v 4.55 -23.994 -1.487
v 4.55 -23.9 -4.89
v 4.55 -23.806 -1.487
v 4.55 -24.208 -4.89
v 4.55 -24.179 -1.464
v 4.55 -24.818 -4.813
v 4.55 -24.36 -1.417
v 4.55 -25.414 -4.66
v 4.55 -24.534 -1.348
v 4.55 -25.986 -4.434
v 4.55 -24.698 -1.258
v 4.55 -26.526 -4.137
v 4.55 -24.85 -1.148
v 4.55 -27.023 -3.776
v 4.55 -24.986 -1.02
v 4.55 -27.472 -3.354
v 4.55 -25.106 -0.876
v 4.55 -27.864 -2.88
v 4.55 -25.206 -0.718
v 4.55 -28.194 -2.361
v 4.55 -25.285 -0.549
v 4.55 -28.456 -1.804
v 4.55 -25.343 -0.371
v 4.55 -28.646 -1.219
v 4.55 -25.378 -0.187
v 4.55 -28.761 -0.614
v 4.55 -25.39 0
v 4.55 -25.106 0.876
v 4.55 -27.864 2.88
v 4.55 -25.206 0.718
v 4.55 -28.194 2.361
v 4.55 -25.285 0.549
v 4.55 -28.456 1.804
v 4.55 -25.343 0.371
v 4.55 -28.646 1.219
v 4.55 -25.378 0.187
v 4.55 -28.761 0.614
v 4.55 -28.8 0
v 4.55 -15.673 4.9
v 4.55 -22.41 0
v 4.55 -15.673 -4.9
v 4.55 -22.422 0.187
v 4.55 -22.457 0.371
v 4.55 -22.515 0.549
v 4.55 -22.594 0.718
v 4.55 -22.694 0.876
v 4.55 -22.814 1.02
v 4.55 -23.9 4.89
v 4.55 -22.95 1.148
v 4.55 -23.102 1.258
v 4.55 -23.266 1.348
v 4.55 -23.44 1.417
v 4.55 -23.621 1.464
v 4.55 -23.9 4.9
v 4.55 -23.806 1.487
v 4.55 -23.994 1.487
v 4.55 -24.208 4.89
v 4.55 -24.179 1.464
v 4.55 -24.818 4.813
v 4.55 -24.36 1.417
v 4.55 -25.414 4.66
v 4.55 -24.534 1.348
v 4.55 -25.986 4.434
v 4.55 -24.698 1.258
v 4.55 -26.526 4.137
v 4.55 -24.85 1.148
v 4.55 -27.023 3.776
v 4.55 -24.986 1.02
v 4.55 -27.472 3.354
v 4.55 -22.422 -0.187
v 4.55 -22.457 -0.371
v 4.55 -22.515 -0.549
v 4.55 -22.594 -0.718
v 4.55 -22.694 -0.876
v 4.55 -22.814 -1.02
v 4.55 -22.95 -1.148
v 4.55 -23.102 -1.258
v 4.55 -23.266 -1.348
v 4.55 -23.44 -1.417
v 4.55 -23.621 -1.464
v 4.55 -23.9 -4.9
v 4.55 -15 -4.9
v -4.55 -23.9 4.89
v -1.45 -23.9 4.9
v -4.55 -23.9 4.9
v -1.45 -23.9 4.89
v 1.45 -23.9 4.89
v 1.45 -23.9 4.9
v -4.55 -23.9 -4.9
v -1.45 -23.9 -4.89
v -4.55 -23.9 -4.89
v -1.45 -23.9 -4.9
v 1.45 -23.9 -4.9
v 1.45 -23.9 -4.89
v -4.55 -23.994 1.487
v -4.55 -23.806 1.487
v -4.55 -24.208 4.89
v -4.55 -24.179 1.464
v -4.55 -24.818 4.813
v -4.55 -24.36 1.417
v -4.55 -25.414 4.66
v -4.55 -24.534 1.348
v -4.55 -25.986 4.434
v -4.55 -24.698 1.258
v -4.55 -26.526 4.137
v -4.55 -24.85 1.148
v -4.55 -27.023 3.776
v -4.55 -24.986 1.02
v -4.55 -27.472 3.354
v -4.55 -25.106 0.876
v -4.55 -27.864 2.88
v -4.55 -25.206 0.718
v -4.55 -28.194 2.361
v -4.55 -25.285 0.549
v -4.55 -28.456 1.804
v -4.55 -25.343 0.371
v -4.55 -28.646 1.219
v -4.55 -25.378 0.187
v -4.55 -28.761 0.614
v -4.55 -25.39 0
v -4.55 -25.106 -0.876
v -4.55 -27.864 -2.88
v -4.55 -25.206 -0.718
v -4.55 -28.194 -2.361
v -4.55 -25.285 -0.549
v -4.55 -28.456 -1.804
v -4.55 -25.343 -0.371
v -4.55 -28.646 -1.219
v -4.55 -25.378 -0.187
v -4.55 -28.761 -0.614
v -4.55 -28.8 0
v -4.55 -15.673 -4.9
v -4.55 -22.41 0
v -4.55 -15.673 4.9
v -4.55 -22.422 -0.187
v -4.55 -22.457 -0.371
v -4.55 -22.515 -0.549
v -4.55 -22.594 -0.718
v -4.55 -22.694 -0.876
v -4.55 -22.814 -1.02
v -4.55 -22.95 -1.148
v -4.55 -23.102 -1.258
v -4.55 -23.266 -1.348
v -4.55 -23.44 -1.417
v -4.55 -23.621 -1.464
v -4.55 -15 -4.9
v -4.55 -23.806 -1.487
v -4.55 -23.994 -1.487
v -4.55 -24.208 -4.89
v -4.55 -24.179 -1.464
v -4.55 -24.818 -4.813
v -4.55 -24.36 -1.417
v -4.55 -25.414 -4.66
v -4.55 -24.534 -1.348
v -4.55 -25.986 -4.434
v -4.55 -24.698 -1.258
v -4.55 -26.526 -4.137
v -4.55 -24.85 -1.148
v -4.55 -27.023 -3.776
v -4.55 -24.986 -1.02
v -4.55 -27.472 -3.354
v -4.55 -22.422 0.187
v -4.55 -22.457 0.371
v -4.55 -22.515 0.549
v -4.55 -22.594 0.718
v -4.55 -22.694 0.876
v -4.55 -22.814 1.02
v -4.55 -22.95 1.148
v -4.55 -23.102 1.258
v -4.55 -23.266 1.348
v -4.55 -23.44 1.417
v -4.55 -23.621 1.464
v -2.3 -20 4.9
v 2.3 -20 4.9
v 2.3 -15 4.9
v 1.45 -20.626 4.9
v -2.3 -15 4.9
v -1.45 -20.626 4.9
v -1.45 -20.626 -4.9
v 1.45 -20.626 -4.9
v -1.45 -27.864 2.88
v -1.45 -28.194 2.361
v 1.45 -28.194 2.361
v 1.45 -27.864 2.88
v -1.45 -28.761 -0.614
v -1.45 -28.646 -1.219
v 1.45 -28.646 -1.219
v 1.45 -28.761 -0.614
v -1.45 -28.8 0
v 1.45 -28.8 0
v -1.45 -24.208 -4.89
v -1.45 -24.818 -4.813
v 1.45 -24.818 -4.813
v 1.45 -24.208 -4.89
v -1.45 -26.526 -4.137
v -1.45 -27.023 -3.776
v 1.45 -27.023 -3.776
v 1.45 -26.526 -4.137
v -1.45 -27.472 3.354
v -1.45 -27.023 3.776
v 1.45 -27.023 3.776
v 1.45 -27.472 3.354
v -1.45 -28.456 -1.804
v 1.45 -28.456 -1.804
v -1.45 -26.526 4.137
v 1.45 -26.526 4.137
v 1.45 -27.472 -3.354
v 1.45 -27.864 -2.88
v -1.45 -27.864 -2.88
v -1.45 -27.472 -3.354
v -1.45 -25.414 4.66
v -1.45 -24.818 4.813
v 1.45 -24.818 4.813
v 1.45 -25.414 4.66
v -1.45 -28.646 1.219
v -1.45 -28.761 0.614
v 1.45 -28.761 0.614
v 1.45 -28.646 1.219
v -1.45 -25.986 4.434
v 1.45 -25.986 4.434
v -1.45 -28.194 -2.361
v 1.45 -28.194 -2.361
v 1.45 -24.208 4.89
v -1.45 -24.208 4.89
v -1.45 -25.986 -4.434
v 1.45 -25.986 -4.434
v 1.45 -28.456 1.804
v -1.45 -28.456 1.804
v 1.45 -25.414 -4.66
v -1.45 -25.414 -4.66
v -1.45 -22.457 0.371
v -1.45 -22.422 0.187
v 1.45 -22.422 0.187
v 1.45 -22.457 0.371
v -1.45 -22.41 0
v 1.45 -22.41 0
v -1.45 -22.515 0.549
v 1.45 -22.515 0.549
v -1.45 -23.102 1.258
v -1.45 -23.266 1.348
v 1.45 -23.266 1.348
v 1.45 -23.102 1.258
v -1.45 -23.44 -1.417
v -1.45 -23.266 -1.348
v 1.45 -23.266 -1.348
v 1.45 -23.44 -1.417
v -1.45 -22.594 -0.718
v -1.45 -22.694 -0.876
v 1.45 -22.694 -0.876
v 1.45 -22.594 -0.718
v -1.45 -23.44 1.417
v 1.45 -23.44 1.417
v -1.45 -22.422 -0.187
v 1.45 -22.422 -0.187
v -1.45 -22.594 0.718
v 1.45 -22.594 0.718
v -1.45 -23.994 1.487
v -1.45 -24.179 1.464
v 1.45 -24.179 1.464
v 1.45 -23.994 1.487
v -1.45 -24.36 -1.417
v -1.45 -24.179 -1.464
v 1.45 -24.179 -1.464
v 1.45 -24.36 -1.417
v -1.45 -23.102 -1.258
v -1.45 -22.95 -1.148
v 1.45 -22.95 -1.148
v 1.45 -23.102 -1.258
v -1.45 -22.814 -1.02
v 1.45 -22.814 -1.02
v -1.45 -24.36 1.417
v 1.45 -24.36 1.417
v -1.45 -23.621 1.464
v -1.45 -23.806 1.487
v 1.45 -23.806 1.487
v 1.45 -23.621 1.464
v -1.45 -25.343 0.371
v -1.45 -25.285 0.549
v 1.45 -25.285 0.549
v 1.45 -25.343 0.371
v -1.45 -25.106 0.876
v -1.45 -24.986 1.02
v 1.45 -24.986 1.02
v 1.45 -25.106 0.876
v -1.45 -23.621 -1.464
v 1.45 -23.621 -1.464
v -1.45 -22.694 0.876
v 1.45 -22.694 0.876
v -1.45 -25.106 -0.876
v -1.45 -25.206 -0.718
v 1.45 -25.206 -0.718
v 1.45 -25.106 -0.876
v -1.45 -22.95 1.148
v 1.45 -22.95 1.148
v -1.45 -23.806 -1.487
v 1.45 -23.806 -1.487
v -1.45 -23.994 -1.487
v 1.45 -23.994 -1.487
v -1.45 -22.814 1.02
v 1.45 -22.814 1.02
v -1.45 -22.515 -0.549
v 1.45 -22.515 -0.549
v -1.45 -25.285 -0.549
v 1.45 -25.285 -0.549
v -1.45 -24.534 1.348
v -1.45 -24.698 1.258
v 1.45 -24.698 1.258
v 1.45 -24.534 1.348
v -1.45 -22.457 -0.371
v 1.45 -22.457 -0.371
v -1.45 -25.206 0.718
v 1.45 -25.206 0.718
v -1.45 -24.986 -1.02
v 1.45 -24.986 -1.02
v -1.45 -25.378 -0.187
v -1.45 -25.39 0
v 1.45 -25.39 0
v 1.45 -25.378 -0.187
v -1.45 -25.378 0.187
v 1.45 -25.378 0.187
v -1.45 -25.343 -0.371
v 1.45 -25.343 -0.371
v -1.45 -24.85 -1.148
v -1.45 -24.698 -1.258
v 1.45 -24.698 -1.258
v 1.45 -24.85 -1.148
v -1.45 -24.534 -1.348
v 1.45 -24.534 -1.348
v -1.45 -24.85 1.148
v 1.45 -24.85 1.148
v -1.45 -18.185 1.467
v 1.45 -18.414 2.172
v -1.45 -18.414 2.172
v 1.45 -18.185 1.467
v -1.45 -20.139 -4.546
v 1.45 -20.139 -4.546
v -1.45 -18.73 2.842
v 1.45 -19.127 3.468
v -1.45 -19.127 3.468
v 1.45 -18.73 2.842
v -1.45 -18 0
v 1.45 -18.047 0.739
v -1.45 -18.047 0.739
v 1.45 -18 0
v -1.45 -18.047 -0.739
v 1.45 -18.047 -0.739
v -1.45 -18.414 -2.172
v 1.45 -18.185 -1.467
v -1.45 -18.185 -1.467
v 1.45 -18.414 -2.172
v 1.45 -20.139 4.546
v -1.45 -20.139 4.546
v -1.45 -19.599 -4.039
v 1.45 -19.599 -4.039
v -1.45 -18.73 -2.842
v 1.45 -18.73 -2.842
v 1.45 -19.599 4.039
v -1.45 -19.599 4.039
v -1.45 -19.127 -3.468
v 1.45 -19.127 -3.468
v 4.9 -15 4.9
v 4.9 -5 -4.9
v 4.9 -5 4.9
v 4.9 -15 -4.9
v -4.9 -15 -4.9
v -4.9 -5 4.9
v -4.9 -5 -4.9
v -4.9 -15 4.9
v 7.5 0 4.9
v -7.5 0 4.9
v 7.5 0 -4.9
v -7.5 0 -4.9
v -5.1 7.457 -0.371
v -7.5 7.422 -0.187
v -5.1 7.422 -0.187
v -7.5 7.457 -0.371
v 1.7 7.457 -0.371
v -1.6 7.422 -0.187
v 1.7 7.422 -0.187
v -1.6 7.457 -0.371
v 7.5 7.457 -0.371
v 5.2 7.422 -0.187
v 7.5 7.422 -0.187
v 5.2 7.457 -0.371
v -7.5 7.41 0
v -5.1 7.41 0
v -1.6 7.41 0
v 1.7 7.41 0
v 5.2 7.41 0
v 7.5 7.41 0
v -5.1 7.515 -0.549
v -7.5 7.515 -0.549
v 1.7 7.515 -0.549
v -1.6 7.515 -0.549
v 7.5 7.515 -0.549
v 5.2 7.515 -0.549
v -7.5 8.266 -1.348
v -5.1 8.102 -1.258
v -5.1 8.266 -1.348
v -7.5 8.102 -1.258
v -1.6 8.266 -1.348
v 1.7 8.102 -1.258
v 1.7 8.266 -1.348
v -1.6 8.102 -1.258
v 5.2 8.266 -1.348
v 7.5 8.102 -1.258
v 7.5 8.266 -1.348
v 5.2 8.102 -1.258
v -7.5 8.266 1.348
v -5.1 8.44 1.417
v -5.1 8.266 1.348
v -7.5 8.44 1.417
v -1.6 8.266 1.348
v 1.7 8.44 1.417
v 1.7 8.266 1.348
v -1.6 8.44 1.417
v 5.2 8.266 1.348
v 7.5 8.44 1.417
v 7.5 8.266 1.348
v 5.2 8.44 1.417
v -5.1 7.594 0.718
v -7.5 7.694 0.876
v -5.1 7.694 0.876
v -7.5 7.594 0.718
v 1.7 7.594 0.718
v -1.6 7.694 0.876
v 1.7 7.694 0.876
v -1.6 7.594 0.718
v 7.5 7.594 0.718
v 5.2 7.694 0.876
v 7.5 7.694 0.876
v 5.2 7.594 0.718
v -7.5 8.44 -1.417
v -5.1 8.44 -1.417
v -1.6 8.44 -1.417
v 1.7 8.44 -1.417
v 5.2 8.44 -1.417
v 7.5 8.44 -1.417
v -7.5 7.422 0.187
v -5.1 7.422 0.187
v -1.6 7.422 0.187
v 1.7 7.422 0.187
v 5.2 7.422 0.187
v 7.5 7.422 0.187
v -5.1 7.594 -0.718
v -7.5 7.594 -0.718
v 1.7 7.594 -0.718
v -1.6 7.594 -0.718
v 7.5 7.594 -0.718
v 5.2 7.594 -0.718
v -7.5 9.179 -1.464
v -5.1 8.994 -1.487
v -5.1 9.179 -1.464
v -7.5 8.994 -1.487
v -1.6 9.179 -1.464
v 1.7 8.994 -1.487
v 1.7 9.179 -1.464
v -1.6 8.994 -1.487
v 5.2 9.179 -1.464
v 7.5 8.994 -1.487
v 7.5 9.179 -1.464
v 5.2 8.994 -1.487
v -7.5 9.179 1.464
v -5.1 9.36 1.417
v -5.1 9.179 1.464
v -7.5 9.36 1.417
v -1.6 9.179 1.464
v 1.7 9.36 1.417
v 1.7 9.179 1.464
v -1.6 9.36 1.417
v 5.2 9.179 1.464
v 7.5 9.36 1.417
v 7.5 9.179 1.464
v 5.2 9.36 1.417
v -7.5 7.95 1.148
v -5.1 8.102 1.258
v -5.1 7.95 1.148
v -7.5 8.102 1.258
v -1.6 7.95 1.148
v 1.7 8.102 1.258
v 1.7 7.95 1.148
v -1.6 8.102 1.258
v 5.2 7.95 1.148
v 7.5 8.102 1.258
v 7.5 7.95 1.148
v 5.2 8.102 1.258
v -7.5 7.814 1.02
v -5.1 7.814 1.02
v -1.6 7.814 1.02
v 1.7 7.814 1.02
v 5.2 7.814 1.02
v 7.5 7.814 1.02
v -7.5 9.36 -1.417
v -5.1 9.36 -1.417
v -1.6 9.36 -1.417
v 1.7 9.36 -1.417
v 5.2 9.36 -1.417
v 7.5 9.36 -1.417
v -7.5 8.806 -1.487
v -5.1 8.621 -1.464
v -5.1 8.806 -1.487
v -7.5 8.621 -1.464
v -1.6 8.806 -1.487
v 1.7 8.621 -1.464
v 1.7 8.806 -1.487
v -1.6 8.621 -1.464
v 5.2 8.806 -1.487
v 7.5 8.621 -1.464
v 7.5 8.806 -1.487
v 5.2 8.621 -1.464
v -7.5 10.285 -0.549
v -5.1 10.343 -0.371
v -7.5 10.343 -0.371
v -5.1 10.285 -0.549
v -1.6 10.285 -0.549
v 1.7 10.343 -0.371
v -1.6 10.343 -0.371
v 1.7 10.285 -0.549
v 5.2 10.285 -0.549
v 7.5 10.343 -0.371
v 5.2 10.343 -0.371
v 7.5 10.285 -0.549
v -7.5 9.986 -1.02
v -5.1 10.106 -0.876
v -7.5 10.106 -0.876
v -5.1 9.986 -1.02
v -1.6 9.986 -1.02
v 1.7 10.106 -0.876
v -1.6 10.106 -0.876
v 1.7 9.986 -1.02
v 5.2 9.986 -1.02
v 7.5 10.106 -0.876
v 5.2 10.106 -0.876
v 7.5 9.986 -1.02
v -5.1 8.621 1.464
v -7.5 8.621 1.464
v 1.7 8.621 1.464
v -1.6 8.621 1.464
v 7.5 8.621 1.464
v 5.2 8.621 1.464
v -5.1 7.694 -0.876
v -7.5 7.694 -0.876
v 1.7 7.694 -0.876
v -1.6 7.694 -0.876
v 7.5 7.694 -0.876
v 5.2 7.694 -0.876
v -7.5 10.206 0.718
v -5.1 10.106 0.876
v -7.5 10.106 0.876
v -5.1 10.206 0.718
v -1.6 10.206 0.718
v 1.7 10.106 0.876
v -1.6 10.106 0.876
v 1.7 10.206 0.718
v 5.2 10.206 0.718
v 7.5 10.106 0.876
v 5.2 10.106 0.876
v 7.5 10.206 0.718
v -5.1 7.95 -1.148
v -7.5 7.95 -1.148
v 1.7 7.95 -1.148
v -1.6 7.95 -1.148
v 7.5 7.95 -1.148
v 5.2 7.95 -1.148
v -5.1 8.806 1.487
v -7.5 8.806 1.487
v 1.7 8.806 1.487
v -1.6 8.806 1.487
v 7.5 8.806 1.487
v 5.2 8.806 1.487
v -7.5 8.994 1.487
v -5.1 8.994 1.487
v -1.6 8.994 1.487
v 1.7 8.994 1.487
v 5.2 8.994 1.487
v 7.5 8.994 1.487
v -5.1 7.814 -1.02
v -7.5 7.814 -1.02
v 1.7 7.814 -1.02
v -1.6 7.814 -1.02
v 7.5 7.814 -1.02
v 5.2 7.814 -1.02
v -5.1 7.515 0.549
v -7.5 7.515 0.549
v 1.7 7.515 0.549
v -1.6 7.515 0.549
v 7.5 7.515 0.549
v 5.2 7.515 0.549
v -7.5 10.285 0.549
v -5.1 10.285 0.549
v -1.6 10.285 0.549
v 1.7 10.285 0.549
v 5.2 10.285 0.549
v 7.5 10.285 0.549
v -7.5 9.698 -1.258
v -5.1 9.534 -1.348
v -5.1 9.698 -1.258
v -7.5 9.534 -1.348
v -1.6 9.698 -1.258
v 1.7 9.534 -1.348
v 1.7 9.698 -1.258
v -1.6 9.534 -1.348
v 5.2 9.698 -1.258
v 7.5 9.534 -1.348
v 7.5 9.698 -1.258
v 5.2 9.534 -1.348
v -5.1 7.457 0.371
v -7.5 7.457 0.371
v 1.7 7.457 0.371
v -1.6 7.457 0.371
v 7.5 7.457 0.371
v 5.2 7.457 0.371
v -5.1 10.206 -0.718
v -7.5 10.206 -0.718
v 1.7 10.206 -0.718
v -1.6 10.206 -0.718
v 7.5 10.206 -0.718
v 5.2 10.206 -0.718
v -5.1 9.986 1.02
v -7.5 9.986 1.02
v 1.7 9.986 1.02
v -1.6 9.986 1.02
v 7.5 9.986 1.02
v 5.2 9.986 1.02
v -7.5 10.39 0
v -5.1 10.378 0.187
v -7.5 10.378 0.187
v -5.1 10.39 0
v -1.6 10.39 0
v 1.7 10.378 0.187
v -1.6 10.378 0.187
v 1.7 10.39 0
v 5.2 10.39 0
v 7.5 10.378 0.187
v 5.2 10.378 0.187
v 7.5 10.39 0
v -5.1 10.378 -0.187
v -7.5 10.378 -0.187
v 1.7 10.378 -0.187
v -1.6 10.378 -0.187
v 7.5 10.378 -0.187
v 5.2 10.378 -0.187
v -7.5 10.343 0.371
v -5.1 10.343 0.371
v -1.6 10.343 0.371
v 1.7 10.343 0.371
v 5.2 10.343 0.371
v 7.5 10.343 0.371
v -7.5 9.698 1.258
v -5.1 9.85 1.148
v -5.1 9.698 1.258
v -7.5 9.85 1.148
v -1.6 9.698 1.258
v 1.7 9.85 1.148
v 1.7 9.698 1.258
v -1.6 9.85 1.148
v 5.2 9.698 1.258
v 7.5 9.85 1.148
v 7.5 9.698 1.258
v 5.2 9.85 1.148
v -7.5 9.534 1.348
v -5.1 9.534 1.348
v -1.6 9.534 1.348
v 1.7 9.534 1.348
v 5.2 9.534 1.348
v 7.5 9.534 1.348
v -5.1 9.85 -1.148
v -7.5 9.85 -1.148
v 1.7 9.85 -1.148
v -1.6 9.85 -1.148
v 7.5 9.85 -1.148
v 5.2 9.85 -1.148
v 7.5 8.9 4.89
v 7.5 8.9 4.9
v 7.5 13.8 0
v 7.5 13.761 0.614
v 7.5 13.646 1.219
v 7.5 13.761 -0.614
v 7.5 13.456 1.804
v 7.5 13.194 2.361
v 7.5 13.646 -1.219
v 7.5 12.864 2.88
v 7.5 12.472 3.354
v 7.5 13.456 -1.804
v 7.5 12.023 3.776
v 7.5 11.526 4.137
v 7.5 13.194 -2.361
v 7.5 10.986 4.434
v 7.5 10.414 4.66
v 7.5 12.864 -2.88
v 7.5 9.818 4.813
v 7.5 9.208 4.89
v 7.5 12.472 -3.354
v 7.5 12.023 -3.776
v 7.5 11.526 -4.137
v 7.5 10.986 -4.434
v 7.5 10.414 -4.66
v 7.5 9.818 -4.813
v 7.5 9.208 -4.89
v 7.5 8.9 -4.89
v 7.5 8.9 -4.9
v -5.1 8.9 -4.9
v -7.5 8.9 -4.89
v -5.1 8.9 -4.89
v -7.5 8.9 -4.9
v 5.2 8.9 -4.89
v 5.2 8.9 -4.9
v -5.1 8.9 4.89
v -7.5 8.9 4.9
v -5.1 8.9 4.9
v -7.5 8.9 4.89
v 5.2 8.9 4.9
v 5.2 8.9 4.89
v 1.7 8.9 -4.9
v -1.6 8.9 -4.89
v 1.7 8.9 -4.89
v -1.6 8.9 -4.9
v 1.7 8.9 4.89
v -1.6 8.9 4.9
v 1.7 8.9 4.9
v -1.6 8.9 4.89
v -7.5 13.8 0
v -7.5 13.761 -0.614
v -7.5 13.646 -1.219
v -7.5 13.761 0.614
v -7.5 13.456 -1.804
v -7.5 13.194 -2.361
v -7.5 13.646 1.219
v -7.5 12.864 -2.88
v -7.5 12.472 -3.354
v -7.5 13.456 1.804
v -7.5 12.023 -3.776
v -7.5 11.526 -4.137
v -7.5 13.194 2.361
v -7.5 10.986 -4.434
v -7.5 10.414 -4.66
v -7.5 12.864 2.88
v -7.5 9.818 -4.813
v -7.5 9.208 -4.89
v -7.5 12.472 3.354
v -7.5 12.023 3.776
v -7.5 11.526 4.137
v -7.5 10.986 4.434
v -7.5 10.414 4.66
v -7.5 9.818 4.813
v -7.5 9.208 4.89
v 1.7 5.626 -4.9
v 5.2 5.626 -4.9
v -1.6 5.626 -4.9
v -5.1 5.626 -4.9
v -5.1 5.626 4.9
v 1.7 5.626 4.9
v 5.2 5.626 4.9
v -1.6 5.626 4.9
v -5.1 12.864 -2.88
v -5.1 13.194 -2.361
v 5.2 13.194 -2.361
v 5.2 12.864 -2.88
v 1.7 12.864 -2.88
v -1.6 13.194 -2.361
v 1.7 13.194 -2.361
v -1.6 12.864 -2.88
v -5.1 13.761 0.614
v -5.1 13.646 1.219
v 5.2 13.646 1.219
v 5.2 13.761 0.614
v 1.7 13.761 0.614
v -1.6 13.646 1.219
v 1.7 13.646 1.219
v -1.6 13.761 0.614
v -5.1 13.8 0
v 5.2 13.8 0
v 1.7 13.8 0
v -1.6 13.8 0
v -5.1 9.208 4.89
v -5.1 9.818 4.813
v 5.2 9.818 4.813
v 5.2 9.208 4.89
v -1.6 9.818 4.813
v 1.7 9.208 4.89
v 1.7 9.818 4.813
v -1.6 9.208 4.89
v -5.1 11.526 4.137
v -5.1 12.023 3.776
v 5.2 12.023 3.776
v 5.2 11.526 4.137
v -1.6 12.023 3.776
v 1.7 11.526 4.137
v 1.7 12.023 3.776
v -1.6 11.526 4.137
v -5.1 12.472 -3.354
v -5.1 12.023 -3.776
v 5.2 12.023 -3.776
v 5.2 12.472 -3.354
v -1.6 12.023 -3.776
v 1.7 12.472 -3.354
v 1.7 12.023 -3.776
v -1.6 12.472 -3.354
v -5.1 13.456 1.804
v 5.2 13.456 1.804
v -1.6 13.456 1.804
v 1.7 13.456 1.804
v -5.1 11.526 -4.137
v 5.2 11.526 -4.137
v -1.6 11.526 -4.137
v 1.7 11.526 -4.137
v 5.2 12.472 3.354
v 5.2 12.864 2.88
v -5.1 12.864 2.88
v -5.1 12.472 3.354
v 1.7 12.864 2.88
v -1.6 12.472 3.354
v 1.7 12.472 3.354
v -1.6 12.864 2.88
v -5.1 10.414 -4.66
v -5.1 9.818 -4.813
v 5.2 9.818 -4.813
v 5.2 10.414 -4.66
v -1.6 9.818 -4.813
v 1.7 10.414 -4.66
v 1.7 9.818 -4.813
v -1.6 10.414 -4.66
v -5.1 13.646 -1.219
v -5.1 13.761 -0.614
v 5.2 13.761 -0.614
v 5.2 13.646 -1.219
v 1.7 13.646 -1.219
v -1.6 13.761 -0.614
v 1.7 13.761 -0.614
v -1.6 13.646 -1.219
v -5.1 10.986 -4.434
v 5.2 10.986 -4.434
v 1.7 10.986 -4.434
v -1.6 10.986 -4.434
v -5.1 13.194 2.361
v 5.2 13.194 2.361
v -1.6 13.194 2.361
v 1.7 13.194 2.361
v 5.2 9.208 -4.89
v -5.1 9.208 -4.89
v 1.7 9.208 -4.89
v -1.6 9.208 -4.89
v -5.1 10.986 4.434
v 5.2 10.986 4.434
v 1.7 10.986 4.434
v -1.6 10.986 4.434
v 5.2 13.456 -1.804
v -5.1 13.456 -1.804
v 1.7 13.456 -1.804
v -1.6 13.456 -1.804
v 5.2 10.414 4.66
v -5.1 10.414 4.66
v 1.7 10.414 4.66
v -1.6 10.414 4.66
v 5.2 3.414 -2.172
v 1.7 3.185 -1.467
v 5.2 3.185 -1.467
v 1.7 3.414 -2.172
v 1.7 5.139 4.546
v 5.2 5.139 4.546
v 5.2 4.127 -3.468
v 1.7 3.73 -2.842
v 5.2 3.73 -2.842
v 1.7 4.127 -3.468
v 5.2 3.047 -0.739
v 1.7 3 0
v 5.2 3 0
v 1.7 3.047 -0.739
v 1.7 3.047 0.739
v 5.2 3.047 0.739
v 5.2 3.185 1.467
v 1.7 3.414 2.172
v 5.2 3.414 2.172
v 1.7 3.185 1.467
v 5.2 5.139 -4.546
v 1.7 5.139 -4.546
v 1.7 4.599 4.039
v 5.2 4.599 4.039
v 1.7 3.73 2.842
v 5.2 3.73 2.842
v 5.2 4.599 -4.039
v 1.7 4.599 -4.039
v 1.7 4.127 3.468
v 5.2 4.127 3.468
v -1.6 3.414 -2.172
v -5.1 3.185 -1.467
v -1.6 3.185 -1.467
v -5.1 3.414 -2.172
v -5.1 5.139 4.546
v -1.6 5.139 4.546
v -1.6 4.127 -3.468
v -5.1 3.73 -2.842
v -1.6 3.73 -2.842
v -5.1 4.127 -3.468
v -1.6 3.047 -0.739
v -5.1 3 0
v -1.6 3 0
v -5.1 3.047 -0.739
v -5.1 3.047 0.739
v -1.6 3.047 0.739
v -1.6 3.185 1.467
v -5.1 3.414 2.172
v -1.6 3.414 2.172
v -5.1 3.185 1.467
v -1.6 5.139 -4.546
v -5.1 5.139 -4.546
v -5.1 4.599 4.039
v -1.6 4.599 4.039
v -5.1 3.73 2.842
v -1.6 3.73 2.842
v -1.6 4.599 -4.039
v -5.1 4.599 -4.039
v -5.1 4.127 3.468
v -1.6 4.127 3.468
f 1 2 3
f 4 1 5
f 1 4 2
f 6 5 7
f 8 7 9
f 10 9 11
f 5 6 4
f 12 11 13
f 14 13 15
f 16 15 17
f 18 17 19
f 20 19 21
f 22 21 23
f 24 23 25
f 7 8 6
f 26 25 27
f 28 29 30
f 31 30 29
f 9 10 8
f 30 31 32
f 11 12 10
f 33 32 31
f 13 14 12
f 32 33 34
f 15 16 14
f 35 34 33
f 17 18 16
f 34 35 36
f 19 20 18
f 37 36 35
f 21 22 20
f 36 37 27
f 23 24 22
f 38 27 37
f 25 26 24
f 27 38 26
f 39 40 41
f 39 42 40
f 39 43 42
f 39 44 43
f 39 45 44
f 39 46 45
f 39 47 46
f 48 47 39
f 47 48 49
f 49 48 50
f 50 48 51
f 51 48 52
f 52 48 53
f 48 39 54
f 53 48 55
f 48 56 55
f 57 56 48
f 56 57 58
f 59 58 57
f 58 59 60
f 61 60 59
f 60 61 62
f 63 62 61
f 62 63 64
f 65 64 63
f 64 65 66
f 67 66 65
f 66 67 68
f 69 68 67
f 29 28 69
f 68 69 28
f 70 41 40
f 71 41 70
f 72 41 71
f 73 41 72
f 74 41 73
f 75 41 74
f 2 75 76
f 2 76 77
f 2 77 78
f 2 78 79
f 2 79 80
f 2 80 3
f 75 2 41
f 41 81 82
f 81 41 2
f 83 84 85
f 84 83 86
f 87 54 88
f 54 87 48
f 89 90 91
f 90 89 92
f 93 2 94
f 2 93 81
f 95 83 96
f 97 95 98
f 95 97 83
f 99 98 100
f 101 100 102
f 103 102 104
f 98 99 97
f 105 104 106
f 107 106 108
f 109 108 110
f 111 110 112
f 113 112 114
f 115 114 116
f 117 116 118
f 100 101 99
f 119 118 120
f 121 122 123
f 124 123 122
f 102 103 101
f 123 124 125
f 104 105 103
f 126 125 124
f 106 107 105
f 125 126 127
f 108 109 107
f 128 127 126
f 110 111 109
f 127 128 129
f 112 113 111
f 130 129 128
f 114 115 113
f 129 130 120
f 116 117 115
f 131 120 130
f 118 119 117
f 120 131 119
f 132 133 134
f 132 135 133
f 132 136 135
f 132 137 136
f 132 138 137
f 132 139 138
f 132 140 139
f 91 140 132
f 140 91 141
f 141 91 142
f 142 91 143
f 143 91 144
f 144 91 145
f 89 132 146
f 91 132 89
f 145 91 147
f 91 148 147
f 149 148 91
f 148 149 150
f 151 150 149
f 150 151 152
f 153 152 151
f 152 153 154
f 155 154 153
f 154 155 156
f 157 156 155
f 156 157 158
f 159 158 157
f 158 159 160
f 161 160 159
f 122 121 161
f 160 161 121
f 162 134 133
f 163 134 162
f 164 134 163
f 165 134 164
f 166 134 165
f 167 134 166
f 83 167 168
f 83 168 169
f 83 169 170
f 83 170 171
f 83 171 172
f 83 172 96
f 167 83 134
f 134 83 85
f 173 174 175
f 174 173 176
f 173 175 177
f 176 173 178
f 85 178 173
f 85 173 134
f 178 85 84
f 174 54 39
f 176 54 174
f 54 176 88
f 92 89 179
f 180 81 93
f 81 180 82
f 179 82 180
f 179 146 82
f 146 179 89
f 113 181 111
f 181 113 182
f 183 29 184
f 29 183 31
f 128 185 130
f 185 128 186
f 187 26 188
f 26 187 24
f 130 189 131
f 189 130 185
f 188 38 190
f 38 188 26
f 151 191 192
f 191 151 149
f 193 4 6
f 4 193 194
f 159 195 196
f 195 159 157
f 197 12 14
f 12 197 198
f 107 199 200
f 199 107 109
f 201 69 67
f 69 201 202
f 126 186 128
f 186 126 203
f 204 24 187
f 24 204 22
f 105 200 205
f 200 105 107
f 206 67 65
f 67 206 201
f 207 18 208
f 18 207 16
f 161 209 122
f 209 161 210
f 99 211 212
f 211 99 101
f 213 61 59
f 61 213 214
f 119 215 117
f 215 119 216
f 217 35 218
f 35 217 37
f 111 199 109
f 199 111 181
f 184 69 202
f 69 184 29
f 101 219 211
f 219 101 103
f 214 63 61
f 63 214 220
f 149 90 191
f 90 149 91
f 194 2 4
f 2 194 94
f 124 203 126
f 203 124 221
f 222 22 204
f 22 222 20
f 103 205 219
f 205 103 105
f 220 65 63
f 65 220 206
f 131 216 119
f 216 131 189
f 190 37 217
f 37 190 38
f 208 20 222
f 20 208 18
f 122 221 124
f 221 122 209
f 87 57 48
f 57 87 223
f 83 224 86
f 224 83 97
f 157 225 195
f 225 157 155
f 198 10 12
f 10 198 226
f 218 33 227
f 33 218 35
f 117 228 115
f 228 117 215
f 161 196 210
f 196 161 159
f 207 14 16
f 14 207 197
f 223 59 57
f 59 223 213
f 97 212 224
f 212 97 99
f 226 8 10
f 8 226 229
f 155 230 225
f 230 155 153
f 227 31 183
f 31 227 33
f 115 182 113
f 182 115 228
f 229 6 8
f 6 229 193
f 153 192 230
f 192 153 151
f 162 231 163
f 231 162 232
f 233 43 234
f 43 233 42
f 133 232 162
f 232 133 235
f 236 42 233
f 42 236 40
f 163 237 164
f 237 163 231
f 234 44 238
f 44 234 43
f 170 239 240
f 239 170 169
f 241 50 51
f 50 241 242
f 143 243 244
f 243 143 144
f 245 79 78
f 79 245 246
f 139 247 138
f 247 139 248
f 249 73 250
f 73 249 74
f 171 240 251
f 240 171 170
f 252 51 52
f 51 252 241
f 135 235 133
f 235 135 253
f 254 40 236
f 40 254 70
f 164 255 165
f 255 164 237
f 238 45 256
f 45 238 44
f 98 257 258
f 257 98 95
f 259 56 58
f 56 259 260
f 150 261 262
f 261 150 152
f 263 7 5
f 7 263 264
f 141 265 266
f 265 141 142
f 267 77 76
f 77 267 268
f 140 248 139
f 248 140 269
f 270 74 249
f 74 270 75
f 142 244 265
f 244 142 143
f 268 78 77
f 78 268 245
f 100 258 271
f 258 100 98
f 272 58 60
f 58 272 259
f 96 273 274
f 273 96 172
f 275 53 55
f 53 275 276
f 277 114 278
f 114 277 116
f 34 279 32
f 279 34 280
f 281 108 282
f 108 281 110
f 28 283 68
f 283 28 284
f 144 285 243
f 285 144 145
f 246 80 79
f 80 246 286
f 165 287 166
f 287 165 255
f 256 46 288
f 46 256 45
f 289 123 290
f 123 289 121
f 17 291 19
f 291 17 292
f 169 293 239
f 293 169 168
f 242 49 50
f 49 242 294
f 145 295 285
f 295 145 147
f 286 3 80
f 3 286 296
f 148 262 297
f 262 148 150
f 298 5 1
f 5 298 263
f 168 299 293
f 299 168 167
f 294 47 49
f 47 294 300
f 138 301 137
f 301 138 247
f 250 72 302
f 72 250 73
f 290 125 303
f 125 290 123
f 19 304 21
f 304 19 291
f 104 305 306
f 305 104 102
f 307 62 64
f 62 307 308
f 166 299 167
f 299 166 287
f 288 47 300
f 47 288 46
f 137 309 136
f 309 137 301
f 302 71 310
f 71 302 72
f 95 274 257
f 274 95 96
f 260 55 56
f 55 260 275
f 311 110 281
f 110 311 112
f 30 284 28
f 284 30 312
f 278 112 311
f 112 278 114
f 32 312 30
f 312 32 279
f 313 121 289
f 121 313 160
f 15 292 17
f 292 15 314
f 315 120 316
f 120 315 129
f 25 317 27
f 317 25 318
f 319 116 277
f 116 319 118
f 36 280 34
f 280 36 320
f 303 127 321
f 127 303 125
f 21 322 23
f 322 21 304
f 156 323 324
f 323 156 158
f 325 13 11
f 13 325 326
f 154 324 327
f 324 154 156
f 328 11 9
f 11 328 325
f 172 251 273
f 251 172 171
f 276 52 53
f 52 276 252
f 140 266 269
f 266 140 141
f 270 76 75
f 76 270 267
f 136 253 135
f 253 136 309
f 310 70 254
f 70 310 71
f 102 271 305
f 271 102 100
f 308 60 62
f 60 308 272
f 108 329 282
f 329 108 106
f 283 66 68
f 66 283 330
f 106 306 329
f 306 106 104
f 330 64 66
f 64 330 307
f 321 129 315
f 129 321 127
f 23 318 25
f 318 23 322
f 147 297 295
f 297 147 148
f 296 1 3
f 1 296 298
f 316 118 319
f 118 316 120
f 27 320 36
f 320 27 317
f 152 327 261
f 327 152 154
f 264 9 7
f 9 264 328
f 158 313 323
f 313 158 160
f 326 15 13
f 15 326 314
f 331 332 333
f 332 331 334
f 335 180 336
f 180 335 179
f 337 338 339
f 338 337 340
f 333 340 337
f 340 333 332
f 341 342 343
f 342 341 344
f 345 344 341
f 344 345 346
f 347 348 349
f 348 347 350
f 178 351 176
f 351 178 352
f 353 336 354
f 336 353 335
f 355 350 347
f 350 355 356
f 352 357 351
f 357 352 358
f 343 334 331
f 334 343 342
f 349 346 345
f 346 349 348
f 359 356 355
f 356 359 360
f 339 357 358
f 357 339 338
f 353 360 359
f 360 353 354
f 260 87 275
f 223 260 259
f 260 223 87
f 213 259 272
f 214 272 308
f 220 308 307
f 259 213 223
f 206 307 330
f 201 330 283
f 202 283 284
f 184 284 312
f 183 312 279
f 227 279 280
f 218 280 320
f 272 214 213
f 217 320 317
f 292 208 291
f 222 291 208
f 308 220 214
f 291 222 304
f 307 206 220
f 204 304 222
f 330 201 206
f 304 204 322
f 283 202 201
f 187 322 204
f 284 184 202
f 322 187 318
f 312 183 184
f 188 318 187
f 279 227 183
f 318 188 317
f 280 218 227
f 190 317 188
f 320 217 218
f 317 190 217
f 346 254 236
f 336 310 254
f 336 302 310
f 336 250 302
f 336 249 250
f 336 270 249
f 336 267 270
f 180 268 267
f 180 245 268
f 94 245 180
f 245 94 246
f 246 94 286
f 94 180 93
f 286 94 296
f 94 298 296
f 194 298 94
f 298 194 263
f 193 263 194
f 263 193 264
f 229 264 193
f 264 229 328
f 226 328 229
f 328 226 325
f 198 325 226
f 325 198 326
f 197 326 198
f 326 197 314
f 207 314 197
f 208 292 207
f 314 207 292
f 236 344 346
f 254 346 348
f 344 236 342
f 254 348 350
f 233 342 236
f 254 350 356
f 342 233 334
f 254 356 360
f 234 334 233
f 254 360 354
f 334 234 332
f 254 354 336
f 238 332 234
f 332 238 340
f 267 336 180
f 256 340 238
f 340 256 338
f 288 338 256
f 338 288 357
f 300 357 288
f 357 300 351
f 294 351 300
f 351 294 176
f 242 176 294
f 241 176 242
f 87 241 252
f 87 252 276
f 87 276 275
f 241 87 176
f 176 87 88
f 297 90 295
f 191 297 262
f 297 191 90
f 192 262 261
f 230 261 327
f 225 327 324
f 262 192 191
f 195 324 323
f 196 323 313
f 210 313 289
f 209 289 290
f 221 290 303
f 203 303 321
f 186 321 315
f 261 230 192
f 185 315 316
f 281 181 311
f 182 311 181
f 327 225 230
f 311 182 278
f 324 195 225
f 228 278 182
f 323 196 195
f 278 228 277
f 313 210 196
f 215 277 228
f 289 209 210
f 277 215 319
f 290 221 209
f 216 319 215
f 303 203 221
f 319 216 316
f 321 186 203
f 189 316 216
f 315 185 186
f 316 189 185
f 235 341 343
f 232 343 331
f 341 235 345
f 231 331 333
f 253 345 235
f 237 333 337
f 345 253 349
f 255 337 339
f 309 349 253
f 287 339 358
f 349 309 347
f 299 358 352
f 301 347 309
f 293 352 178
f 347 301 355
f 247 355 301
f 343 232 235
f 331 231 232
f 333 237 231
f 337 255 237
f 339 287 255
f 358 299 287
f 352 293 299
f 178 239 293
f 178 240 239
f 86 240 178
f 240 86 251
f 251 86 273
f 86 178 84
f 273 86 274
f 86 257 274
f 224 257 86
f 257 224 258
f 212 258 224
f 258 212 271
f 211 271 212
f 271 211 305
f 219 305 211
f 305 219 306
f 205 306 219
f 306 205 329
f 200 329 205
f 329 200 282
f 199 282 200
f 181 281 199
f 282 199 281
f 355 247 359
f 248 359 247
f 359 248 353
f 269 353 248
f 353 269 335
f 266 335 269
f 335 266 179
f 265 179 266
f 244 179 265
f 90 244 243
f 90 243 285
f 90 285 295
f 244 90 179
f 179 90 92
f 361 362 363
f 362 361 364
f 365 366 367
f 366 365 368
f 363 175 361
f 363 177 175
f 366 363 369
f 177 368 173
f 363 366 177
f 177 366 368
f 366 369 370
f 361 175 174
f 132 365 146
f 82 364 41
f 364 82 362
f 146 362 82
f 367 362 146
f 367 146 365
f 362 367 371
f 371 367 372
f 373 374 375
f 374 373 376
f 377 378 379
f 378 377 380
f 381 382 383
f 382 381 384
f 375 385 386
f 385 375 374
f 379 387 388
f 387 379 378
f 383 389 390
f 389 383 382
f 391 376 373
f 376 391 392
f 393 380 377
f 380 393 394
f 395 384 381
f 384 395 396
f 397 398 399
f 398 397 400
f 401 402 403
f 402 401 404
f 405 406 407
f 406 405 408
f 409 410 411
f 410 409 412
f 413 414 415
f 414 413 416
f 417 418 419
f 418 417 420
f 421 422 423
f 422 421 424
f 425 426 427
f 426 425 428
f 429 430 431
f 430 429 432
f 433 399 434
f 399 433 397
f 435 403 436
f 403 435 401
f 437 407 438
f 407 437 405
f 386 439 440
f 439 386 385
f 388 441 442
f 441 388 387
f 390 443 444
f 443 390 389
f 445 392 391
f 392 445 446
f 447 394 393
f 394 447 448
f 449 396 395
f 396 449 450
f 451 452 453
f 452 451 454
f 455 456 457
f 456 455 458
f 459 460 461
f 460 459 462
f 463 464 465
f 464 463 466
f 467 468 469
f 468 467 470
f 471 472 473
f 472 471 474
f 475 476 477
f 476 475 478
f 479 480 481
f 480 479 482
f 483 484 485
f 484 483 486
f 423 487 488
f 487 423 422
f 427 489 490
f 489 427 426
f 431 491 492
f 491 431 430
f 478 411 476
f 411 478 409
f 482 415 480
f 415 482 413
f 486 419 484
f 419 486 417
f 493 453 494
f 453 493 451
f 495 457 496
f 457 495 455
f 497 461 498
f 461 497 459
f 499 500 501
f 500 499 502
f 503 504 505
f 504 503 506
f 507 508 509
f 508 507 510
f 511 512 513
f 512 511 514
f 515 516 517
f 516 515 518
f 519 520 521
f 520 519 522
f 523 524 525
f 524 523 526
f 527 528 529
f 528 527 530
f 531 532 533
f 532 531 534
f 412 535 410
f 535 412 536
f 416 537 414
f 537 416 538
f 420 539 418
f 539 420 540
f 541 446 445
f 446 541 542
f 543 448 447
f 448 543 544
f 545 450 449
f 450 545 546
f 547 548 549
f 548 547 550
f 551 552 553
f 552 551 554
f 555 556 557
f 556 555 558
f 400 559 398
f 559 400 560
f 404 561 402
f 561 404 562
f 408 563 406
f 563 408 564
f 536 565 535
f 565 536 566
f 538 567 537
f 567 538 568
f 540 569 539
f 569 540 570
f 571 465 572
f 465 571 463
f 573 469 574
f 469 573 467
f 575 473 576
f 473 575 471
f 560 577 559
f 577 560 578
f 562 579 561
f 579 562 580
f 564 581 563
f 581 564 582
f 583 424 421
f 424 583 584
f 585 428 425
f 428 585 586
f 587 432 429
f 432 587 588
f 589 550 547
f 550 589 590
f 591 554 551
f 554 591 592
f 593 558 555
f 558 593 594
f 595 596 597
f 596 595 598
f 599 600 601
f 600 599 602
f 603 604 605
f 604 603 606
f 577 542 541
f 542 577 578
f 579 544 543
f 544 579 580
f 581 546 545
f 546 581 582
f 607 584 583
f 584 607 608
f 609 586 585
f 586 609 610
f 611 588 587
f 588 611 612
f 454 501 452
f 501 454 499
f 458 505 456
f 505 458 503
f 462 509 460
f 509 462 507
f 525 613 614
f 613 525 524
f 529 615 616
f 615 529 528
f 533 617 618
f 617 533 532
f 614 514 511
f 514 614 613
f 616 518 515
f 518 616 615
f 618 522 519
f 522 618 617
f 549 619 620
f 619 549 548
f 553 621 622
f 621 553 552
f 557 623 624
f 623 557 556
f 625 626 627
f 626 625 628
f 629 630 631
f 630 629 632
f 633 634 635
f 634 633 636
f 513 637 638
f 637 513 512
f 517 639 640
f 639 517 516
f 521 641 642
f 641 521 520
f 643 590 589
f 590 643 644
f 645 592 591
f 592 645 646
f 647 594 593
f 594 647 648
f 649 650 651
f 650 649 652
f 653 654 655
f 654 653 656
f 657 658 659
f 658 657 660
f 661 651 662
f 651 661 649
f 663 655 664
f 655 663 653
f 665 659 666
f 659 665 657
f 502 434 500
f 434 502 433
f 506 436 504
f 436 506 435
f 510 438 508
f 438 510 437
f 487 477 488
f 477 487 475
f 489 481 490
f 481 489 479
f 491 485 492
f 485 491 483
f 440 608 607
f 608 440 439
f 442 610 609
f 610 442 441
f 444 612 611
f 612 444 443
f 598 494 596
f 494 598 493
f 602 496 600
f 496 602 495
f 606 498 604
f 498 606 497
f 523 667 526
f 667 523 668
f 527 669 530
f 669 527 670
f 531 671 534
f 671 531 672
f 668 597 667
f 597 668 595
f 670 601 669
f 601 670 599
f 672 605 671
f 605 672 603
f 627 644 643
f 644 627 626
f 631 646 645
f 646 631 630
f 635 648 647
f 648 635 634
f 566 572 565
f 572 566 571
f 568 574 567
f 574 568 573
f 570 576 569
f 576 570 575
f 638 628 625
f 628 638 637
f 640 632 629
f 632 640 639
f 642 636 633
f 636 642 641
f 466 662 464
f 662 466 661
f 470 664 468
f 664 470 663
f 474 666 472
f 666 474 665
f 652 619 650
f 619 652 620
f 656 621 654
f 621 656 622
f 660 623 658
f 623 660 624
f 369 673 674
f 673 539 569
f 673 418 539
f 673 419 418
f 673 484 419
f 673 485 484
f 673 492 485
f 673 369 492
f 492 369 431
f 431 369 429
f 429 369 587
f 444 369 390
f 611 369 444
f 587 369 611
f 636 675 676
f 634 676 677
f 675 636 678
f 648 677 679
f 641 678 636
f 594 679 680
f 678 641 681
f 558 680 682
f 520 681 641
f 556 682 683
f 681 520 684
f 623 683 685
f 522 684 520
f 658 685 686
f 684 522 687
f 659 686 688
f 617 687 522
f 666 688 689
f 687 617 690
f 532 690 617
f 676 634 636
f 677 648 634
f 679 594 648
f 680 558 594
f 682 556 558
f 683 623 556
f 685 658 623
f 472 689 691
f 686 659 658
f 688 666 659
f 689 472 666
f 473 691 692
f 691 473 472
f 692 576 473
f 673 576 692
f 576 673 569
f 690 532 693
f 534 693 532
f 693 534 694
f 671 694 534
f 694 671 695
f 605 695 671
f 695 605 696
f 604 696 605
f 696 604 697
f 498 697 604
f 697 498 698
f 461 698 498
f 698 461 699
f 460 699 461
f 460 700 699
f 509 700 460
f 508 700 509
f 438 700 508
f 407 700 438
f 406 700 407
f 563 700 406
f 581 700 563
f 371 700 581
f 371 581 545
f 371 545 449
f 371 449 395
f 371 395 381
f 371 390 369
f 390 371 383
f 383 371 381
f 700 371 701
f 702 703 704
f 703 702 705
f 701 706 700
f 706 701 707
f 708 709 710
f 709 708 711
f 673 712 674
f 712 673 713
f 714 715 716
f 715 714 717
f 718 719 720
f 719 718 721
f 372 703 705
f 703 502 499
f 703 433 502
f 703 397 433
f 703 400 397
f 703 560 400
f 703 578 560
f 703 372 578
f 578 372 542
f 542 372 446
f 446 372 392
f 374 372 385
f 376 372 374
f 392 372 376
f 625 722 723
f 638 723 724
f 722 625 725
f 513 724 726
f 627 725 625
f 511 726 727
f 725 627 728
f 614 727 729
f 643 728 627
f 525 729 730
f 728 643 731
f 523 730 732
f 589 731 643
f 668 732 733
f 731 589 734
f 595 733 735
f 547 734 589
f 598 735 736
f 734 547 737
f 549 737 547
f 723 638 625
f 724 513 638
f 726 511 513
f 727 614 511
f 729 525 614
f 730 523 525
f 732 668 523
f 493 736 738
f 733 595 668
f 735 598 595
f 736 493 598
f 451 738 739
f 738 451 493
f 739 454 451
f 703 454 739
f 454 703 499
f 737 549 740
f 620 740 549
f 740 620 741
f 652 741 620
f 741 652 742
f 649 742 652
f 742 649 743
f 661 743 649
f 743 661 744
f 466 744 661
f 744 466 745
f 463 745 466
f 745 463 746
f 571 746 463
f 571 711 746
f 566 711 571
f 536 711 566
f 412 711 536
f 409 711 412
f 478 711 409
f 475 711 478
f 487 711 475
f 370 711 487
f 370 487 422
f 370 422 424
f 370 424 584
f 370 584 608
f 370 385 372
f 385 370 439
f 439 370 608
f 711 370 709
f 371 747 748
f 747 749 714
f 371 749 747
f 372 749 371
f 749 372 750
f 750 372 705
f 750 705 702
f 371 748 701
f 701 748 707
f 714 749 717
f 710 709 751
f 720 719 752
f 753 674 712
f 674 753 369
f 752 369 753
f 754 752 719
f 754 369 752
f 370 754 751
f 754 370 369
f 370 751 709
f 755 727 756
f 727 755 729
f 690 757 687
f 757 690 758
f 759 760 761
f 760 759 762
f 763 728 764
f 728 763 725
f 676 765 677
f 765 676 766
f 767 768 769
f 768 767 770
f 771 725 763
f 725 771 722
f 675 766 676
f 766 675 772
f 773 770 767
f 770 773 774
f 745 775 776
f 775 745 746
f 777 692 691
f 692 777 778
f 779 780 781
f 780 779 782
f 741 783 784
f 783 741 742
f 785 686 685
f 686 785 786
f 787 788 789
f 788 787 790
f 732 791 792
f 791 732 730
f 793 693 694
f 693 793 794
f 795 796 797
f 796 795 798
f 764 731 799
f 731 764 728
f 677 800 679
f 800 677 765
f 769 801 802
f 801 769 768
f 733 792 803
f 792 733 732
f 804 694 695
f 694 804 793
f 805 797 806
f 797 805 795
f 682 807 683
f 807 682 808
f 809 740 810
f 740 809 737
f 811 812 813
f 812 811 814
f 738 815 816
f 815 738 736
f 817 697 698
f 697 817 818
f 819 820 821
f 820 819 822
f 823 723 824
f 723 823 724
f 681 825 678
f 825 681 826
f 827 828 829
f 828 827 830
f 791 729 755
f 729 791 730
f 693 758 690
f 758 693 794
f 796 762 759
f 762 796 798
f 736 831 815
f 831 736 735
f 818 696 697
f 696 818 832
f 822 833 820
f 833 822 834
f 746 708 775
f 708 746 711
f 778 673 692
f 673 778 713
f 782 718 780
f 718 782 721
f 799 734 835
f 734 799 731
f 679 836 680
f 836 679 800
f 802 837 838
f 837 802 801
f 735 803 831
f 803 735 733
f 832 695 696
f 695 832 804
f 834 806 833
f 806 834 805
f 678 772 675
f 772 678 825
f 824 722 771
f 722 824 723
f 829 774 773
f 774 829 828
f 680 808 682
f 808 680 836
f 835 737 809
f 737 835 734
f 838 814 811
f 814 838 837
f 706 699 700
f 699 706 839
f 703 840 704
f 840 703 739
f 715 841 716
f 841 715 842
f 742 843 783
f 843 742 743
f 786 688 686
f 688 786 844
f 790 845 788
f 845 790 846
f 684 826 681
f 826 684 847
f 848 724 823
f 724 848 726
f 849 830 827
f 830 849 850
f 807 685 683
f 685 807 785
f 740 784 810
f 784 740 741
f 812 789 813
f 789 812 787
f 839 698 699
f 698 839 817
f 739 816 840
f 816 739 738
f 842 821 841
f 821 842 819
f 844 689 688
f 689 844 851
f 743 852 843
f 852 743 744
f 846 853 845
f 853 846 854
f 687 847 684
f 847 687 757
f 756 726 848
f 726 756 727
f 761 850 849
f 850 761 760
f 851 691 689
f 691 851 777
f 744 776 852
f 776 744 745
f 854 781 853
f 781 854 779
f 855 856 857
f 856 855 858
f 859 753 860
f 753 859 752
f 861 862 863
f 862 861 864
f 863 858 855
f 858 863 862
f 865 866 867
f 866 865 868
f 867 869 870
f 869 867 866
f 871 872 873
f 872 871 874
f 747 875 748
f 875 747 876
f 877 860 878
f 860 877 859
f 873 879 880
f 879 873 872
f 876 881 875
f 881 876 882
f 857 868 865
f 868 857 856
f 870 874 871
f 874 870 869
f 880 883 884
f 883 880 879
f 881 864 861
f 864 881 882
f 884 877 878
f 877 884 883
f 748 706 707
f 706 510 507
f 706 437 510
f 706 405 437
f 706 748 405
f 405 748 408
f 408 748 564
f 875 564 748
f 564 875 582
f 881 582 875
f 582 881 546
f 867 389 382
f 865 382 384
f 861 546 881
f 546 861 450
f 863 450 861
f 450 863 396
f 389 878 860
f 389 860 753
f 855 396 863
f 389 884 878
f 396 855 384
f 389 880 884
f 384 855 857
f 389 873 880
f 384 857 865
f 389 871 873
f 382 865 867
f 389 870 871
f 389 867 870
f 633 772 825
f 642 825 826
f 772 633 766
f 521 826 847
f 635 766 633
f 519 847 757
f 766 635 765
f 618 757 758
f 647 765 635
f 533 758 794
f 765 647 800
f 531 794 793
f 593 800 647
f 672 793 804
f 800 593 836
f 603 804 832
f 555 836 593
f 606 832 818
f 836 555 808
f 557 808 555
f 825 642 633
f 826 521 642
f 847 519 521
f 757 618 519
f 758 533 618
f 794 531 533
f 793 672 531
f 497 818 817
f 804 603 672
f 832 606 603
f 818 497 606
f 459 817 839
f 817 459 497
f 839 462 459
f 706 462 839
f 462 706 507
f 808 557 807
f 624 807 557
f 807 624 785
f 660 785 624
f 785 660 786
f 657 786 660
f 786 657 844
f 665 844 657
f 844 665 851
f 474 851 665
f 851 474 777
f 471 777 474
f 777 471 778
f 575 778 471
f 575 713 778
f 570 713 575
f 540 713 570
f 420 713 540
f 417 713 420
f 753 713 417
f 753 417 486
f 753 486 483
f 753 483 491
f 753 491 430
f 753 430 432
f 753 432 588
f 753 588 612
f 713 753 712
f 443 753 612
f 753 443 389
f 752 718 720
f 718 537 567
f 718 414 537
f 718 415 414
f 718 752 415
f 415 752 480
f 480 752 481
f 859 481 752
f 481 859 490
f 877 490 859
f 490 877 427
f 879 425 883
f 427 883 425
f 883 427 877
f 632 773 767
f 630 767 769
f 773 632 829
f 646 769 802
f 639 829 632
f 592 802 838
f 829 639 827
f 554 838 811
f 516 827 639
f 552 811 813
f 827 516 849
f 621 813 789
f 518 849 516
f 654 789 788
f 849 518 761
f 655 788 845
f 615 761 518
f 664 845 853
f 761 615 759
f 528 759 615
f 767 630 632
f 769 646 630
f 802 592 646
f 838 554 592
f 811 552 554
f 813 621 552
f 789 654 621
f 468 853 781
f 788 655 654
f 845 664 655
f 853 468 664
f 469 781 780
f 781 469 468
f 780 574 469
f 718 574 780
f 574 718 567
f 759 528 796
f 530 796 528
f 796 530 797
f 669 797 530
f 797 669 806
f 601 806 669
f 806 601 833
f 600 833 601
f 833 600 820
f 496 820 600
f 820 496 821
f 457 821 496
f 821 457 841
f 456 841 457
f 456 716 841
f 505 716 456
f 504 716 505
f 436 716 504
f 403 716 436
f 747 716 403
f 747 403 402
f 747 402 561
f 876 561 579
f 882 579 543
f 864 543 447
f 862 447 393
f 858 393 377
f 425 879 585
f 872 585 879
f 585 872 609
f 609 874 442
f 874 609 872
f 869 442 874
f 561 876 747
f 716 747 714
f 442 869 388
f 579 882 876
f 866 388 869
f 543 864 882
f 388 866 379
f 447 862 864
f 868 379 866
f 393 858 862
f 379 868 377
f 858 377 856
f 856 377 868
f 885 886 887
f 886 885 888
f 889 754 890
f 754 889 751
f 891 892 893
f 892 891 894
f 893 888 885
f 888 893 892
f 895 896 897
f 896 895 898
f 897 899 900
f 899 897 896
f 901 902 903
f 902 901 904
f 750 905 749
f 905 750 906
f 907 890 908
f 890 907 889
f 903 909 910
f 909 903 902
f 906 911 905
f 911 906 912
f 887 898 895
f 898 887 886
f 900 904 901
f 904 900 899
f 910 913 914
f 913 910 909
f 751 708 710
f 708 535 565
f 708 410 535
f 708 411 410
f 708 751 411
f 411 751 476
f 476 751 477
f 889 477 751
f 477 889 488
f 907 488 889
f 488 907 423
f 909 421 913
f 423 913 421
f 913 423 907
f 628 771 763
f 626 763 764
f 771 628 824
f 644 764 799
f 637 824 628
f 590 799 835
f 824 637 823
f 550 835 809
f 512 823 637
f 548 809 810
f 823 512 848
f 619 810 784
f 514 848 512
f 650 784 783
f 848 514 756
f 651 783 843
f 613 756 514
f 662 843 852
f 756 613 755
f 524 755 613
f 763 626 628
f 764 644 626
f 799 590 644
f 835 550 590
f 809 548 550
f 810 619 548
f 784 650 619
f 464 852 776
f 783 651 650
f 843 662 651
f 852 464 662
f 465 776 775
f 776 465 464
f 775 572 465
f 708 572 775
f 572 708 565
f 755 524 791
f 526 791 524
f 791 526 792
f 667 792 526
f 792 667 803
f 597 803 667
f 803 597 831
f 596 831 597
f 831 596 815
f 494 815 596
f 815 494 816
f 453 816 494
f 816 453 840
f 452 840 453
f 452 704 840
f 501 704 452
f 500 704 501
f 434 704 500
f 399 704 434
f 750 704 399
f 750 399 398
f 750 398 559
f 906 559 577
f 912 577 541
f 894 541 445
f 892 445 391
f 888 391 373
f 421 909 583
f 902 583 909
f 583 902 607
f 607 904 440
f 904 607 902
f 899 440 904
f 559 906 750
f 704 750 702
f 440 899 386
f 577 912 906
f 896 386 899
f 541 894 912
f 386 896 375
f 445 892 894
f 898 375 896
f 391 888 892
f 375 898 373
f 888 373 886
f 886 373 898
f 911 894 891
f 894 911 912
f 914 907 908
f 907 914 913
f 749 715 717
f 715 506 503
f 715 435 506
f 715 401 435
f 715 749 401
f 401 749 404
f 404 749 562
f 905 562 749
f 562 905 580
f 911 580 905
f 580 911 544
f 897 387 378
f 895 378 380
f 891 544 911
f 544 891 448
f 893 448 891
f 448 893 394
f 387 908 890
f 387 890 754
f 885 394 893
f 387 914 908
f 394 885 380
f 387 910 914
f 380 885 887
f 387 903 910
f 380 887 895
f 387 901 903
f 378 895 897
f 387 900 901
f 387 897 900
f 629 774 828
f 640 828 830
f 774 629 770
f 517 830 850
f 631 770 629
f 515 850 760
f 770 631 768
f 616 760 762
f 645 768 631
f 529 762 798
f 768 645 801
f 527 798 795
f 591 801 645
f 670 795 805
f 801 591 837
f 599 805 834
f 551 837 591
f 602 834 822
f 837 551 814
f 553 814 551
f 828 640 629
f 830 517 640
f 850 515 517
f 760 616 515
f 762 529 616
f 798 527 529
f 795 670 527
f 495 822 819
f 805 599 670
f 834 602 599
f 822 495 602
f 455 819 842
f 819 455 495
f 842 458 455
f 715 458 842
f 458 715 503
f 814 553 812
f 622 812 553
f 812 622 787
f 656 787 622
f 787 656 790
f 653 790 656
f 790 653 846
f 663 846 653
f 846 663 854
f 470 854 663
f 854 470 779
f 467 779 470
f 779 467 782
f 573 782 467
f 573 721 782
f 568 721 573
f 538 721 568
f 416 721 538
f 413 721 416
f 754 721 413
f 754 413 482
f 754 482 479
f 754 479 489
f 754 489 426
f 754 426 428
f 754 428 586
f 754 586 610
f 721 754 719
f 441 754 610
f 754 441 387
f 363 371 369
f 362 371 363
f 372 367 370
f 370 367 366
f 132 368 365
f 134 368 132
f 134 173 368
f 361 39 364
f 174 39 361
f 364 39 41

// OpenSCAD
// file: go_pro_style_mount.scad
// Go pro style mount
include <MCAD/nuts_and_bolts.scad>;
gp_mount_fin_width=3;
gp_mount_fin_margin=0.1;
gp_mount_fin_clearance=2;
gp_mount_width=17;
gp_mount_radius=9.8;
gp_mount_spacer_height=4;
module go_pro_base(){
    $fn=50;
    translate([-gp_mount_width/2,-gp_mount_radius/2,0]){
        difference(){
            group(){
            //base
            cube([gp_mount_width,
                    gp_mount_radius,
                    gp_mount_radius/2+gp_mount_spacer_height]);
            //rouded part
            translate([0,
                        gp_mount_radius/2,
                        gp_mount_radius/2+ gp_mount_spacer_height])
                rotate([0,90,0])
                    cylinder(h=gp_mount_width,
                            d=gp_mount_radius);
            }
            //fins
            translate([gp_mount_width/2+
                        gp_mount_fin_width/2-gp_mount_fin_margin/2,
                        gp_mount_radius/2,
                        gp_mount_radius/2+ gp_mount_spacer_height])
                rotate([0,90,0])
                    cylinder(
                        h=gp_mount_fin_width+gp_mount_fin_margin,
                        d=gp_mount_radius+gp_mount_fin_clearance);
            
            translate([gp_mount_width/2-3/2*gp_mount_fin_width+
                        gp_mount_fin_margin/2,
                        gp_mount_radius/2,
                        gp_mount_radius/2+ gp_mount_spacer_height])
                rotate([0,90,0])
                    cylinder(h=gp_mount_fin_width+gp_mount_fin_margin,
                            d=gp_mount_radius+gp_mount_fin_clearance);
            translate([gp_mount_width-2,
                        gp_mount_radius/2,
                        gp_mount_radius/2+ gp_mount_spacer_height])
                rotate([0,90,0])
                    nutHole(3);
            translate([2.5,
                        gp_mount_radius/2,
                        gp_mount_radius/2+ gp_mount_spacer_height])
                rotate([0,90,0])
                    boltHole(3,length=30);
        }
    }
}

module go_pro_mount(){
    $fn=50;
    go_fin_hole=gp_mount_fin_width+gp_mount_fin_margin;
    go_fin_space= gp_mount_fin_width-gp_mount_fin_margin;
    go_attach_width=go_fin_hole*2+go_fin_space;
    translate([-go_attach_width/2,-gp_mount_radius/2,0]){
        difference()
        {
            group(){
            //base
            cube([go_attach_width,
                    gp_mount_radius,
                    gp_mount_radius/2+gp_mount_spacer_height]);
            //rouded part
            translate([0,
                        gp_mount_radius/2,
                        gp_mount_radius/2+ gp_mount_spacer_height])
                rotate([0,90,0])
                    cylinder(h=go_attach_width,
                            d=gp_mount_radius);
            }
            //cut / space
            translate(
                [go_fin_hole,
                 gp_mount_radius/2,
                 gp_mount_radius/2+gp_mount_spacer_height
                ])
                rotate([0,90,0])
                    cylinder(h=go_fin_space,
                             d=gp_mount_radius+gp_mount_fin_clearance);
            // bolt
            translate([-5,
                        gp_mount_radius/2,
                        gp_mount_radius/2+ gp_mount_spacer_height])
                rotate([0,90,0])
                    boltHole(3,length=30);
        }
                        
    }
}

module go_pro_fan_mount(){
    $fn=50;
    fan_fin=3.4;
    fan_space=3.4;
    fan_base=15;
    translate([-fan_base/2,-gp_mount_radius/2,0]){
        difference()
        {
            group(){
            //base
            cube([fan_base,
                    gp_mount_radius,
                    gp_mount_radius/2+gp_mount_spacer_height]);
            //rouded part
            translate([0,
                        gp_mount_radius/2,
                        gp_mount_radius/2+ gp_mount_spacer_height])
                rotate([0,90,0])
                    cylinder(h=fan_base,
                            d=gp_mount_radius);
            }
            //fins
            translate([fan_base/2+
                        fan_space/2,
                        gp_mount_radius/2,
                        gp_mount_radius/2+ gp_mount_spacer_height])
                rotate([0,90,0])
                    cylinder(
                        h=fan_fin+gp_mount_fin_margin,
                        d=gp_mount_radius+gp_mount_fin_clearance);
            
            translate([fan_base/2-fan_fin-fan_space/2,
                        gp_mount_radius/2,
                        gp_mount_radius/2+ gp_mount_spacer_height])
                rotate([0,90,0])
                    cylinder(h=fan_fin+gp_mount_fin_margin,
                            d=gp_mount_radius+gp_mount_fin_clearance);

            translate([-5,
                        gp_mount_radius/2,
                        gp_mount_radius/2+ gp_mount_spacer_height])
                rotate([0,90,0])
                    boltHole(3,length=30);
        }
    }
}
// main file
ext_length=15;
ext_thichness=9.8;
include <go_pro_style_mount.scad>;

module prism(l, w, h) {
	translate([0, l, 0]) rotate( a= [90, 0, 0]) 
	linear_extrude(height = l) polygon(points = [
		[0, 0],
		[w, 0],
		[0, h]
	], paths=[[0,1,2,0]]);
}

rotate([90,0,0]){
translate([-ext_thichness/2,-ext_thichness/2,0])
    cube([ext_thichness,ext_thichness,ext_length]);
translate([0,0,ext_length])
go_pro_mount();
    
}
rotate([-90,0,0]){
    go_pro_fan_mount();
}

//reinforcements

//larger
translate([ext_thichness/2,0,-ext_thichness/2])
rotate([90,0,0])
translate([0,0,0])
prism(ext_thichness,15/2-ext_thichness/2,5);


translate([-ext_thichness/2,0,-ext_thichness/2])
rotate([90,0,0])
translate([0,0,0])
prism(ext_thichness,-15/2+ext_thichness/2,5);

//thinner
translate([-ext_thichness/2+15/2-ext_thichness/2,-ext_length,-ext_thichness/2])
rotate([90,0,0])
translate([0,0,0])
prism(ext_thichness,-15/2+ext_thichness/2,5);

translate([ext_thichness/2-15/2+ext_thichness/2,-ext_length,-ext_thichness/2])
rotate([90,0,0])
translate([0,0,0])
prism(ext_thichness,15/2-ext_thichness/2,5);
